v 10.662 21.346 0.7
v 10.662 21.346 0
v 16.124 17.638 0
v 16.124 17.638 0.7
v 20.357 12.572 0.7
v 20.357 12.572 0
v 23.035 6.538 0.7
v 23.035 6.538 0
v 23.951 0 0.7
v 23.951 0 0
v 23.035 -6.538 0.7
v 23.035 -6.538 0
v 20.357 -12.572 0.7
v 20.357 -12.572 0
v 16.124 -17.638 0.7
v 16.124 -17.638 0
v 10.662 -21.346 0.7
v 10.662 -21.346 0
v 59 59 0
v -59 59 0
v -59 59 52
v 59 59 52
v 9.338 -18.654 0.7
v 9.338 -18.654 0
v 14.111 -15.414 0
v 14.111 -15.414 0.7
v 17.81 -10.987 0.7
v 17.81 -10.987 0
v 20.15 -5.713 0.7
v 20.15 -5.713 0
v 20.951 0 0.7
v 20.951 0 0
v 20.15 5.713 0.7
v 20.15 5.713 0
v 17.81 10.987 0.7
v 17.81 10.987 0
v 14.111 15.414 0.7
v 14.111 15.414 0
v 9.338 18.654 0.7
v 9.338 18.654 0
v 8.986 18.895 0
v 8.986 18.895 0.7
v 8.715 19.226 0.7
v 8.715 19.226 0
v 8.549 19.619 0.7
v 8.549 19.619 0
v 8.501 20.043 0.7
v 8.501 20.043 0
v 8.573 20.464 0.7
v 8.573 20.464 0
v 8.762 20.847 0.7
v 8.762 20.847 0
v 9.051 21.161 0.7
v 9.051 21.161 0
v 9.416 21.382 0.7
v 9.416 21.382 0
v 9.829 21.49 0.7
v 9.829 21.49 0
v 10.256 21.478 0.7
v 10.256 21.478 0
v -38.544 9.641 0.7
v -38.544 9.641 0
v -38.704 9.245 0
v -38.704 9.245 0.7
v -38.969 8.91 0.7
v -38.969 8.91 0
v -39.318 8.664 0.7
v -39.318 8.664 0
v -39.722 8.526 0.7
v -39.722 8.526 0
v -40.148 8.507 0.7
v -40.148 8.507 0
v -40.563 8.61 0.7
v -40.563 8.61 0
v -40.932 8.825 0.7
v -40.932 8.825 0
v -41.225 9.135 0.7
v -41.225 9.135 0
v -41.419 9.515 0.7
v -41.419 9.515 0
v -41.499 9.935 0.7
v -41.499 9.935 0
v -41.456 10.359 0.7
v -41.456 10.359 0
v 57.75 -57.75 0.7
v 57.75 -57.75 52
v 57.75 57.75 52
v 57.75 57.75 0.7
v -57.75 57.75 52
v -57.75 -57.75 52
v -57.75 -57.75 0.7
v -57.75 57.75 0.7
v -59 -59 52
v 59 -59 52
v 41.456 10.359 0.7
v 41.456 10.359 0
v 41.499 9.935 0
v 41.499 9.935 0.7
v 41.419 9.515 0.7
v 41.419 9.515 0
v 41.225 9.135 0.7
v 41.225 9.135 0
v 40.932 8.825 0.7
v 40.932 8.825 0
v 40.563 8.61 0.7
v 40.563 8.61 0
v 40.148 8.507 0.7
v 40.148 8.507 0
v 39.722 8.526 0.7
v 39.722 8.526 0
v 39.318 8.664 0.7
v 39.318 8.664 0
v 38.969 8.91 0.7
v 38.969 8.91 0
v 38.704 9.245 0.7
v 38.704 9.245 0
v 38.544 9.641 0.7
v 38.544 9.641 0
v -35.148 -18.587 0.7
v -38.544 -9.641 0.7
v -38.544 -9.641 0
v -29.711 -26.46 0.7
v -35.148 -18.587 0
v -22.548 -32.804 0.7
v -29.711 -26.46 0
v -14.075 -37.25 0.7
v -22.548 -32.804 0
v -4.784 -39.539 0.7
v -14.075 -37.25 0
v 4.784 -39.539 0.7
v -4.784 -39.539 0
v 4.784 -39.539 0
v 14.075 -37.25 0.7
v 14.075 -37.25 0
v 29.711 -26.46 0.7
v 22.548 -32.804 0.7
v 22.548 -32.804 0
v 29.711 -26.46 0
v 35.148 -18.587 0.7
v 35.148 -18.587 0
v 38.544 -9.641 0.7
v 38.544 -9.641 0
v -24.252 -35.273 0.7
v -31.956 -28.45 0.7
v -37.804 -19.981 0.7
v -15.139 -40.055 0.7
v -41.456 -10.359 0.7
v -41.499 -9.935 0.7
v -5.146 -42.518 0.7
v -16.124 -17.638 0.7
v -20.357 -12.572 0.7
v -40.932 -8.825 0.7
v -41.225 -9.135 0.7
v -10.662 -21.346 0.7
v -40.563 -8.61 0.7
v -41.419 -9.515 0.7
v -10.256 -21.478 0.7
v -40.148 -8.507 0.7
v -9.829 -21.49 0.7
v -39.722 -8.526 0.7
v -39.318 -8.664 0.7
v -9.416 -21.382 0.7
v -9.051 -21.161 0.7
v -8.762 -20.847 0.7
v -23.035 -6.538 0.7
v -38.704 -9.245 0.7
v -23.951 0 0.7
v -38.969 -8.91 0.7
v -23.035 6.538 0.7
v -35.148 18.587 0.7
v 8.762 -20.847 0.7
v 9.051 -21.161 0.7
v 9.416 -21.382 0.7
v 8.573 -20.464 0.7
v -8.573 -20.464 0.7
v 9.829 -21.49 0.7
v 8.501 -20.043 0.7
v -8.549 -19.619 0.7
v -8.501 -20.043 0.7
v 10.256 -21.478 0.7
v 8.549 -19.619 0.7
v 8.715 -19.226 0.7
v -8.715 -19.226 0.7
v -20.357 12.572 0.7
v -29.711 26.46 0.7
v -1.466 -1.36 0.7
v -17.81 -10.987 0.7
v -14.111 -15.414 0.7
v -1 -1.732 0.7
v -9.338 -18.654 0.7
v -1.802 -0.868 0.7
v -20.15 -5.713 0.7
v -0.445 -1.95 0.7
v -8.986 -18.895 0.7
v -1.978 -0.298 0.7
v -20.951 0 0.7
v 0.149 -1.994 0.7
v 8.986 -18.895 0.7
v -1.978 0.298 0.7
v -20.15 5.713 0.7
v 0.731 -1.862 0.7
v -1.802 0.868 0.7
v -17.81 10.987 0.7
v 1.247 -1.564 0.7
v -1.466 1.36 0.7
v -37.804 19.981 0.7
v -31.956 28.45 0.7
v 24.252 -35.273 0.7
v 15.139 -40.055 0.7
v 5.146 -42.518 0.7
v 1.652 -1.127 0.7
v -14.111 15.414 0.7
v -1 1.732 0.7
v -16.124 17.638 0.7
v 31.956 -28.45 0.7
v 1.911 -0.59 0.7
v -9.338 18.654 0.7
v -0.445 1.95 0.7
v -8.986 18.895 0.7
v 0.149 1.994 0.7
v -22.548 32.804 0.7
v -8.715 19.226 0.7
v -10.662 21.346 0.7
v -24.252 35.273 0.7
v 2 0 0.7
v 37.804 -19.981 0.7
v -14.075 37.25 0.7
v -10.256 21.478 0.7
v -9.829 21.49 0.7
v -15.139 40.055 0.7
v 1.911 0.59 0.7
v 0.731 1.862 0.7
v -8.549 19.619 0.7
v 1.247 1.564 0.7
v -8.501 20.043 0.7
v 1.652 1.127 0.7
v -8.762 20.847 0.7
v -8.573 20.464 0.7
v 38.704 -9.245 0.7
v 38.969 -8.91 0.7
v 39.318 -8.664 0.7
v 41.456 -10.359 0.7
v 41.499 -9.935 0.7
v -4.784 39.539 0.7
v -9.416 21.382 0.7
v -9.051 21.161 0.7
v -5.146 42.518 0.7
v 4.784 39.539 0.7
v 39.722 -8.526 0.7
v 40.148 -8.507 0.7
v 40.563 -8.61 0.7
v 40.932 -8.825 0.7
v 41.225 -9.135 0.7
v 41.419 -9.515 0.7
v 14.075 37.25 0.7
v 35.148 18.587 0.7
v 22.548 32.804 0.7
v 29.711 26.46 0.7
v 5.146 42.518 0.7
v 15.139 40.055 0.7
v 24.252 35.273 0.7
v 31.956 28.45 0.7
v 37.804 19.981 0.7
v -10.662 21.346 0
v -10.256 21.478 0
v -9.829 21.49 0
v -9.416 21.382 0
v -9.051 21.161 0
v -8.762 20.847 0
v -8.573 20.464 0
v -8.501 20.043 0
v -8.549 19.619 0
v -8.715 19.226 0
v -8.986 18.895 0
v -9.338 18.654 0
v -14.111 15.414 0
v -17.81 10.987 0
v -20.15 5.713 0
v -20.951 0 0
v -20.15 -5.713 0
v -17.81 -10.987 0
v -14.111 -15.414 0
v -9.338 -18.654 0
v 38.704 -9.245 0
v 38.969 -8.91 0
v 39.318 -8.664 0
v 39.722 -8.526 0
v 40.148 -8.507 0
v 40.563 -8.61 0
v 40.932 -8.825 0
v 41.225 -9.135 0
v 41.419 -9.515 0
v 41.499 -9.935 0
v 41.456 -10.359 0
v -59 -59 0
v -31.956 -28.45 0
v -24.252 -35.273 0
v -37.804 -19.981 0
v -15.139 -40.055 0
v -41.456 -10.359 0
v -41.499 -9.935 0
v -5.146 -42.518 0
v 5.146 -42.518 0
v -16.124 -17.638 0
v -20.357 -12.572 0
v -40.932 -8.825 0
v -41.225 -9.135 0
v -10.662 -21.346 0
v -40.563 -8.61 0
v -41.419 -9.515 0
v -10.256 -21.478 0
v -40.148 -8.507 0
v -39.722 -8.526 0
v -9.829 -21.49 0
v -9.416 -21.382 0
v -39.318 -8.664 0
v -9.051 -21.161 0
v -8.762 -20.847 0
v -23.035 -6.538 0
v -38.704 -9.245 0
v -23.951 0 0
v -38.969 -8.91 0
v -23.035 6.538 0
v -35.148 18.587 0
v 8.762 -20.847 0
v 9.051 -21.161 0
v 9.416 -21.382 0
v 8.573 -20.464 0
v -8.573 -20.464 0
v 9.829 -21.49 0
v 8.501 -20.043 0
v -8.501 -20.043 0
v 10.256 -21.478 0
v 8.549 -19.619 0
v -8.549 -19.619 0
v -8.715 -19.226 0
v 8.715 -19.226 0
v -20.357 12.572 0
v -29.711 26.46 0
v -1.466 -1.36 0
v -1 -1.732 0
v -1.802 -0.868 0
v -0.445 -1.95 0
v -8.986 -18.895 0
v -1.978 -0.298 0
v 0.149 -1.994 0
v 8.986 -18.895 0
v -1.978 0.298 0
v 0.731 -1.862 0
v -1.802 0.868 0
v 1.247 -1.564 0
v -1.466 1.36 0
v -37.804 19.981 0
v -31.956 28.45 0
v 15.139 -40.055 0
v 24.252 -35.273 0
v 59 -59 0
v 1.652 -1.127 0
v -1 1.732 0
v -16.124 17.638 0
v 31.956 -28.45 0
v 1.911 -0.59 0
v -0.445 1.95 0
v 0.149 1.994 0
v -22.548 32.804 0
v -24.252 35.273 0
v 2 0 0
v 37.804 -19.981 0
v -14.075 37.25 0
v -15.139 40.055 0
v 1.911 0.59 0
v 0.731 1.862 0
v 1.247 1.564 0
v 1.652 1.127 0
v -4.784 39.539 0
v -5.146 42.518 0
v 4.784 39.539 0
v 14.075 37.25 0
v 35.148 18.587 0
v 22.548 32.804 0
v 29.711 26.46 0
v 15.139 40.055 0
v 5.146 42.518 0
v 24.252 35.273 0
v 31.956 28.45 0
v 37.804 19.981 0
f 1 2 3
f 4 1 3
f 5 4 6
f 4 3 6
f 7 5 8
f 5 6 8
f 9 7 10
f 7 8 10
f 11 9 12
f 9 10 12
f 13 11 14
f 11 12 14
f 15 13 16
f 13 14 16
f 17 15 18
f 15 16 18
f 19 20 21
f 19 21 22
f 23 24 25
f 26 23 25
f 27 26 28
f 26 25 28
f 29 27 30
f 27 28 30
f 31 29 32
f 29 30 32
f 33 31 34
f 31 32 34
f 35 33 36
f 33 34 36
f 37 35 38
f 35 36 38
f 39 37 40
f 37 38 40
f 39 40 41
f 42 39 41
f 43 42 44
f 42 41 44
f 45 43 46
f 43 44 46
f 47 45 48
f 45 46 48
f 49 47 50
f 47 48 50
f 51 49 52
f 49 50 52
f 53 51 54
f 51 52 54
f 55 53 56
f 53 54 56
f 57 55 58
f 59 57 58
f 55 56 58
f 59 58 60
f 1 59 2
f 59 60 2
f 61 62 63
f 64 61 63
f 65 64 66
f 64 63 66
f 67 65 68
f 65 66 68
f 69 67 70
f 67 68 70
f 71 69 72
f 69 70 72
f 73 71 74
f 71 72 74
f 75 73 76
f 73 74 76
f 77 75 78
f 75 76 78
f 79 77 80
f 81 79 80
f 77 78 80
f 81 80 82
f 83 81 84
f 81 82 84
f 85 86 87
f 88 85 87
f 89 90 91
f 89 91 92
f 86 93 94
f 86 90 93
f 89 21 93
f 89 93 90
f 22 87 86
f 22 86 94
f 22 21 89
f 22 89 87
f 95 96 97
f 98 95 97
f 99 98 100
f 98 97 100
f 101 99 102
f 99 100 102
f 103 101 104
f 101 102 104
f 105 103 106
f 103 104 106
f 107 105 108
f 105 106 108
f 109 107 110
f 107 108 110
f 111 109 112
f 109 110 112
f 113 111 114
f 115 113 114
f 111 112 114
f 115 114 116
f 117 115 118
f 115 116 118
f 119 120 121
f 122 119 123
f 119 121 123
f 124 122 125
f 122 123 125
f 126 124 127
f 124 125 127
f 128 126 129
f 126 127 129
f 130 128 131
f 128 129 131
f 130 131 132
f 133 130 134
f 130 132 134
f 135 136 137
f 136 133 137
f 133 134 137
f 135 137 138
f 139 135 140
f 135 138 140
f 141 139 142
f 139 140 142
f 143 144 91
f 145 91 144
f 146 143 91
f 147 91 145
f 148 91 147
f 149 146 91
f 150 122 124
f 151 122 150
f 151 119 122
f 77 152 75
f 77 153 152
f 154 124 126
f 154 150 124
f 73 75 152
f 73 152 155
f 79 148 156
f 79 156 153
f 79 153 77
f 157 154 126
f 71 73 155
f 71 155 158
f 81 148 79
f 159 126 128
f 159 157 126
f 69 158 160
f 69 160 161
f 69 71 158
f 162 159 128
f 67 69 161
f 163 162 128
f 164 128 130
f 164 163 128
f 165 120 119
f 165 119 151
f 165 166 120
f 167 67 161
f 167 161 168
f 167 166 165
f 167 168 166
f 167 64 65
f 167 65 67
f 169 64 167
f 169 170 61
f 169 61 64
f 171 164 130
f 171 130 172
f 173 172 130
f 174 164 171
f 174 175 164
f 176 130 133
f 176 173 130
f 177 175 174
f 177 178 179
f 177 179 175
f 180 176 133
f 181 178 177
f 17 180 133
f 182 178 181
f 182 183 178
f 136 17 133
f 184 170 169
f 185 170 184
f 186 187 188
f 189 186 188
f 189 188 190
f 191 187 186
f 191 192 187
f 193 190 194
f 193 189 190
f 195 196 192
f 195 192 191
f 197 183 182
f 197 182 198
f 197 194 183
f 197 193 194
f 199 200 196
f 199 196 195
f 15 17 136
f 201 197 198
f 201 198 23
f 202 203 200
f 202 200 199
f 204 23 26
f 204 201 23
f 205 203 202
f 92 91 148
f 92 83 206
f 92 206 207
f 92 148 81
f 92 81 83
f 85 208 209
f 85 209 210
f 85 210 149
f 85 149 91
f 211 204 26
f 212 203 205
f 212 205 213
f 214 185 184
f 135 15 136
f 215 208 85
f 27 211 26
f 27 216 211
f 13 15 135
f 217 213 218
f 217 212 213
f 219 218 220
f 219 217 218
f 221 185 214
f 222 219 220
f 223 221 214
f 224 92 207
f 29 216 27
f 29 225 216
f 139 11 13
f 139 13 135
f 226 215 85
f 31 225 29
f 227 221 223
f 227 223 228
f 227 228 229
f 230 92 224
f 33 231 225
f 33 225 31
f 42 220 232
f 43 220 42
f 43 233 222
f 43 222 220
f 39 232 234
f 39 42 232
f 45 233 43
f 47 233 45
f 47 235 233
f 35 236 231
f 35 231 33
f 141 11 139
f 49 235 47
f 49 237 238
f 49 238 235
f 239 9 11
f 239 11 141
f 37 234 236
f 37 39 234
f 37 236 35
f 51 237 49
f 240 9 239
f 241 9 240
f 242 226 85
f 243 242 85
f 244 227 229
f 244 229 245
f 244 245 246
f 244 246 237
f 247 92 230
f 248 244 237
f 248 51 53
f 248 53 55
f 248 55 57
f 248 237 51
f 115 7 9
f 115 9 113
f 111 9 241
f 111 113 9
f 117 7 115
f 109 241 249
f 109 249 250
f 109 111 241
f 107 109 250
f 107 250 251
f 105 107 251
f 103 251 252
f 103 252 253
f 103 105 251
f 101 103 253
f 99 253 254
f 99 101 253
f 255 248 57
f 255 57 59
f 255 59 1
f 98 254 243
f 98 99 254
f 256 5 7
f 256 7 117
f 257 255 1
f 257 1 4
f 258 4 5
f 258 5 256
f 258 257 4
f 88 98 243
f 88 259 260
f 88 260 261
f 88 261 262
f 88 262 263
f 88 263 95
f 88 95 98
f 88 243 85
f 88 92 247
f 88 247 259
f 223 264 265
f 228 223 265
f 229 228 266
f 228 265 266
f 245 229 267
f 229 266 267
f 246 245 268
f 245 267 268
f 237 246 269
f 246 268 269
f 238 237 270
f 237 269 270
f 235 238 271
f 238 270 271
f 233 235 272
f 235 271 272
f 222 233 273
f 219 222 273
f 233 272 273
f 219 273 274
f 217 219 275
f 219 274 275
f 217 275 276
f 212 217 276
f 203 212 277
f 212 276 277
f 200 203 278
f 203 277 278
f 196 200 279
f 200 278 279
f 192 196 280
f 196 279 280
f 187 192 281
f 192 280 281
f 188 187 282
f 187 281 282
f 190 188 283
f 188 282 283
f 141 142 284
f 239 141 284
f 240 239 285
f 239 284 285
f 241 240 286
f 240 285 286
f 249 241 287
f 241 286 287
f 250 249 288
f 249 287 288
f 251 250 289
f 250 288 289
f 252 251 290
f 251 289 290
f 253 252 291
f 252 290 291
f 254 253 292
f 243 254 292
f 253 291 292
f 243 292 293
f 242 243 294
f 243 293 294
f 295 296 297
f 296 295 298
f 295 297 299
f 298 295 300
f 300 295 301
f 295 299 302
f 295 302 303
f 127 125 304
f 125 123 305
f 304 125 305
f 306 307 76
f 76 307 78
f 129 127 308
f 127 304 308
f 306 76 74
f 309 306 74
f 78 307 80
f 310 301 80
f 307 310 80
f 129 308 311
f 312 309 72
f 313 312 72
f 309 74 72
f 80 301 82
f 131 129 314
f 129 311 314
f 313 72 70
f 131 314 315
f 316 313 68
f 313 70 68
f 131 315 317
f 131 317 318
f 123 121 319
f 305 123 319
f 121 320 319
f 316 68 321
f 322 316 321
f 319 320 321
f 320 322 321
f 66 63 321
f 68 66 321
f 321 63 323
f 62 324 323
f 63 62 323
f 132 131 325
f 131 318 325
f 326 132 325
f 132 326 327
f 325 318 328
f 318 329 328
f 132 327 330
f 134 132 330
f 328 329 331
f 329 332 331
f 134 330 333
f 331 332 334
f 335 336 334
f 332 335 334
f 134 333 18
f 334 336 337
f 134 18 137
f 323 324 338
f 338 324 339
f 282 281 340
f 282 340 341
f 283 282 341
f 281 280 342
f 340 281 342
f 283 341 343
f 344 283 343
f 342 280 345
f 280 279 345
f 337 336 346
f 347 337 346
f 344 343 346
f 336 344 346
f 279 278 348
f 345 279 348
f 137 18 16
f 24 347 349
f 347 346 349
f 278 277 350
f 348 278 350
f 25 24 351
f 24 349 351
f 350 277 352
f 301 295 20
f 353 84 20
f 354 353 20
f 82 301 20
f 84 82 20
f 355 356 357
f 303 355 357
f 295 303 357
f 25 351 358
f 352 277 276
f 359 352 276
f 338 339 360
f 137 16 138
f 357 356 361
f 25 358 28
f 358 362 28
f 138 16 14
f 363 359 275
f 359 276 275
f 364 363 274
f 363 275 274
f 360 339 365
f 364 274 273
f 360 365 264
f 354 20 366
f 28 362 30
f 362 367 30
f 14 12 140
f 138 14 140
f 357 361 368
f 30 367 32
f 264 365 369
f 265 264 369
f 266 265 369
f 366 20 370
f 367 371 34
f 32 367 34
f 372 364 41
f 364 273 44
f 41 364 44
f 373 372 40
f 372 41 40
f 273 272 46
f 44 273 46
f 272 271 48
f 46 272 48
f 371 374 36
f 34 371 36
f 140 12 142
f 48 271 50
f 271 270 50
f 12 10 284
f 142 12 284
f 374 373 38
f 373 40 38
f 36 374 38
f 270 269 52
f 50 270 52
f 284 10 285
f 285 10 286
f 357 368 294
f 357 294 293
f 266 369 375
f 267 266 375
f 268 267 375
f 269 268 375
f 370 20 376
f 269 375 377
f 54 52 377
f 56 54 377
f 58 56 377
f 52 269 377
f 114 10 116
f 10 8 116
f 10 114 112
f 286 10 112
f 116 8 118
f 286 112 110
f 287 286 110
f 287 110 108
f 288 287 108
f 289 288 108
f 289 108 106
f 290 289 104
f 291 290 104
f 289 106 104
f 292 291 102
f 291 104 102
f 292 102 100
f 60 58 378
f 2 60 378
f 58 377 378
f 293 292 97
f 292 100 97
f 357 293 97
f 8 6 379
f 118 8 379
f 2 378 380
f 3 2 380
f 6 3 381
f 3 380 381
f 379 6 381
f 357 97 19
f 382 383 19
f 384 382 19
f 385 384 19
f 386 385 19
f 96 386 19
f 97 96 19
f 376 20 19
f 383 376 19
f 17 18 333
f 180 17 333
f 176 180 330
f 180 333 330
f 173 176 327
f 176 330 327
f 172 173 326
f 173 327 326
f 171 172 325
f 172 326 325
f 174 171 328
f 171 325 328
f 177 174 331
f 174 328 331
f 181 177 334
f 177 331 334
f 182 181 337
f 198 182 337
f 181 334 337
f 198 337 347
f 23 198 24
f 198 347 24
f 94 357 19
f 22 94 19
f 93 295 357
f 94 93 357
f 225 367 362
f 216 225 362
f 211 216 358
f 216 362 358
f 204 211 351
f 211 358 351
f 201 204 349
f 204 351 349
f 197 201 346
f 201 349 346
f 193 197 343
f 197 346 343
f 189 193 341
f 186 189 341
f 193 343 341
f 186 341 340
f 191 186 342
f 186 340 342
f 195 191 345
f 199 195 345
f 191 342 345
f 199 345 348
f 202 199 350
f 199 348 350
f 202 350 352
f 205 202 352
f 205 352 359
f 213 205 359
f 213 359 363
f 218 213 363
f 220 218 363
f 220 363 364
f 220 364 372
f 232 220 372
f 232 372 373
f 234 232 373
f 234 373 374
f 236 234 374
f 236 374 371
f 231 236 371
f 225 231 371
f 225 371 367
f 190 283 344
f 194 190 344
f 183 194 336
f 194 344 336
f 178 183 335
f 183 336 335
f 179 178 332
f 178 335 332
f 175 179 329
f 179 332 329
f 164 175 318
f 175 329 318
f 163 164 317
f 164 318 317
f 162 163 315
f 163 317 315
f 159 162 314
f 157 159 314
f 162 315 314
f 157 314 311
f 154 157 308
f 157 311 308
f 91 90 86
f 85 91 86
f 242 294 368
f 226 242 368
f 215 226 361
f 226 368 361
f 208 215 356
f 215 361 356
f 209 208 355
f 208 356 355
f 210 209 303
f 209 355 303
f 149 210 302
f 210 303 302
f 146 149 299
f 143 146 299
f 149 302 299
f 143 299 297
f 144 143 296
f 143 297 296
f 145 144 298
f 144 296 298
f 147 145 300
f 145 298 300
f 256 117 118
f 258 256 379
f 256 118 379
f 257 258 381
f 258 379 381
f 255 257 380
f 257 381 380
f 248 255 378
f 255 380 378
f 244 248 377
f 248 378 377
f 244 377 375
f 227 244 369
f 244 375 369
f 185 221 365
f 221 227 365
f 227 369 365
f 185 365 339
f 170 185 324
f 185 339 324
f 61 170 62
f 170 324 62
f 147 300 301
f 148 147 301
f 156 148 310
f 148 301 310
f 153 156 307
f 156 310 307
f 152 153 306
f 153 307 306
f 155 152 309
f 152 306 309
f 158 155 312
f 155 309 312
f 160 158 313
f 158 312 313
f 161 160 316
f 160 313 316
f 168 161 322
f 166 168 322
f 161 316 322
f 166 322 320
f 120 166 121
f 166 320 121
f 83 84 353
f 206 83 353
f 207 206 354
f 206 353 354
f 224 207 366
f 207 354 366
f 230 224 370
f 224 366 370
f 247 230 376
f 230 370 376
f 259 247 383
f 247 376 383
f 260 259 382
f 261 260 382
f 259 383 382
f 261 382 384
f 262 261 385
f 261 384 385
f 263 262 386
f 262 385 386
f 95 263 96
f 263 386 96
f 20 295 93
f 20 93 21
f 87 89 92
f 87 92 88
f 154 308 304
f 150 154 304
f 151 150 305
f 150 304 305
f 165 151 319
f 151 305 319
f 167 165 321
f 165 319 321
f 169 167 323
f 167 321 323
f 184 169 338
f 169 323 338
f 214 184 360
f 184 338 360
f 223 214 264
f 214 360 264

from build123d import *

# Parameters (mm, degrees)
F0_W     = 118
F0_H     = 118
F1_DEPTH = 52
F2_W     = 115.5
F2_H     = 115.5
F3_DEPTH = 51.3
F4_R     = 2
F5_DEPTH = 25


with BuildPart() as f1:
    # F0 (on Top) → F1 (new body)
    with BuildSketch(Plane.XY):
        Rectangle(F0_W, F0_H)
    extrude(amount=F1_DEPTH)

    # F2 (on face) → F3 (cut)
    with BuildSketch(Plane.XY.offset(52)):
        Rectangle(F2_W, F2_H)
    extrude(amount=-F3_DEPTH, mode=Mode.SUBTRACT)

    # F4 (on face) → F5 (cut)
    with BuildSketch(Plane(origin=(0, 0, 0), x_dir=(1, 0, 0), z_dir=(0, 0, -1))):
        with BuildLine():
            ThreePointArc((38.543689, 9.640613), (40.359387, 8.543689), (41.456311, 10.359387))
            ThreePointArc((41.456311, 10.359387), (0, 42.82883), (-41.456311, 10.359387))
            ThreePointArc((-41.456311, 10.359387), (-40.359387, 8.543689), (-38.543689, 9.640613))
            ThreePointArc((-38.543689, 9.640613), (0, 39.82883), (38.543689, 9.640613))
        make_face()
        with BuildLine():
            ThreePointArc((41.456311, -10.359387), (40.359387, -8.543689), (38.543689, -9.640613))
            ThreePointArc((38.543689, -9.640613), (0, -39.82883), (-38.543689, -9.640613))
            ThreePointArc((-38.543689, -9.640613), (-40.359387, -8.543689), (-41.456311, -10.359387))
            ThreePointArc((-41.456311, -10.359387), (0, -42.82883), (41.456311, -10.359387))
        make_face()
        with BuildLine():
            ThreePointArc((9.337938, -18.654015), (8.654015, -20.662062), (10.662062, -21.345985))
            ThreePointArc((10.662062, -21.345985), (23.950936, 0), (10.662062, 21.345985))
            ThreePointArc((10.662062, 21.345985), (8.654015, 20.662062), (9.337938, 18.654015))
            ThreePointArc((9.337938, 18.654015), (20.950936, 0), (9.337938, -18.654015))
        make_face()
        with BuildLine():
            ThreePointArc((-9.337938, -18.654015), (-20.950936, 0), (-9.337938, 18.654015))
            ThreePointArc((-9.337938, 18.654015), (-8.654015, 20.662062), (-10.662062, 21.345985))
            ThreePointArc((-10.662062, 21.345985), (-23.950936, 0), (-10.662062, -21.345985))
            ThreePointArc((-10.662062, -21.345985), (-8.654015, -20.662062), (-9.337938, -18.654015))
        make_face()
        Circle(F4_R)
    extrude(amount=-F5_DEPTH, mode=Mode.SUBTRACT)


solid = f1.part
